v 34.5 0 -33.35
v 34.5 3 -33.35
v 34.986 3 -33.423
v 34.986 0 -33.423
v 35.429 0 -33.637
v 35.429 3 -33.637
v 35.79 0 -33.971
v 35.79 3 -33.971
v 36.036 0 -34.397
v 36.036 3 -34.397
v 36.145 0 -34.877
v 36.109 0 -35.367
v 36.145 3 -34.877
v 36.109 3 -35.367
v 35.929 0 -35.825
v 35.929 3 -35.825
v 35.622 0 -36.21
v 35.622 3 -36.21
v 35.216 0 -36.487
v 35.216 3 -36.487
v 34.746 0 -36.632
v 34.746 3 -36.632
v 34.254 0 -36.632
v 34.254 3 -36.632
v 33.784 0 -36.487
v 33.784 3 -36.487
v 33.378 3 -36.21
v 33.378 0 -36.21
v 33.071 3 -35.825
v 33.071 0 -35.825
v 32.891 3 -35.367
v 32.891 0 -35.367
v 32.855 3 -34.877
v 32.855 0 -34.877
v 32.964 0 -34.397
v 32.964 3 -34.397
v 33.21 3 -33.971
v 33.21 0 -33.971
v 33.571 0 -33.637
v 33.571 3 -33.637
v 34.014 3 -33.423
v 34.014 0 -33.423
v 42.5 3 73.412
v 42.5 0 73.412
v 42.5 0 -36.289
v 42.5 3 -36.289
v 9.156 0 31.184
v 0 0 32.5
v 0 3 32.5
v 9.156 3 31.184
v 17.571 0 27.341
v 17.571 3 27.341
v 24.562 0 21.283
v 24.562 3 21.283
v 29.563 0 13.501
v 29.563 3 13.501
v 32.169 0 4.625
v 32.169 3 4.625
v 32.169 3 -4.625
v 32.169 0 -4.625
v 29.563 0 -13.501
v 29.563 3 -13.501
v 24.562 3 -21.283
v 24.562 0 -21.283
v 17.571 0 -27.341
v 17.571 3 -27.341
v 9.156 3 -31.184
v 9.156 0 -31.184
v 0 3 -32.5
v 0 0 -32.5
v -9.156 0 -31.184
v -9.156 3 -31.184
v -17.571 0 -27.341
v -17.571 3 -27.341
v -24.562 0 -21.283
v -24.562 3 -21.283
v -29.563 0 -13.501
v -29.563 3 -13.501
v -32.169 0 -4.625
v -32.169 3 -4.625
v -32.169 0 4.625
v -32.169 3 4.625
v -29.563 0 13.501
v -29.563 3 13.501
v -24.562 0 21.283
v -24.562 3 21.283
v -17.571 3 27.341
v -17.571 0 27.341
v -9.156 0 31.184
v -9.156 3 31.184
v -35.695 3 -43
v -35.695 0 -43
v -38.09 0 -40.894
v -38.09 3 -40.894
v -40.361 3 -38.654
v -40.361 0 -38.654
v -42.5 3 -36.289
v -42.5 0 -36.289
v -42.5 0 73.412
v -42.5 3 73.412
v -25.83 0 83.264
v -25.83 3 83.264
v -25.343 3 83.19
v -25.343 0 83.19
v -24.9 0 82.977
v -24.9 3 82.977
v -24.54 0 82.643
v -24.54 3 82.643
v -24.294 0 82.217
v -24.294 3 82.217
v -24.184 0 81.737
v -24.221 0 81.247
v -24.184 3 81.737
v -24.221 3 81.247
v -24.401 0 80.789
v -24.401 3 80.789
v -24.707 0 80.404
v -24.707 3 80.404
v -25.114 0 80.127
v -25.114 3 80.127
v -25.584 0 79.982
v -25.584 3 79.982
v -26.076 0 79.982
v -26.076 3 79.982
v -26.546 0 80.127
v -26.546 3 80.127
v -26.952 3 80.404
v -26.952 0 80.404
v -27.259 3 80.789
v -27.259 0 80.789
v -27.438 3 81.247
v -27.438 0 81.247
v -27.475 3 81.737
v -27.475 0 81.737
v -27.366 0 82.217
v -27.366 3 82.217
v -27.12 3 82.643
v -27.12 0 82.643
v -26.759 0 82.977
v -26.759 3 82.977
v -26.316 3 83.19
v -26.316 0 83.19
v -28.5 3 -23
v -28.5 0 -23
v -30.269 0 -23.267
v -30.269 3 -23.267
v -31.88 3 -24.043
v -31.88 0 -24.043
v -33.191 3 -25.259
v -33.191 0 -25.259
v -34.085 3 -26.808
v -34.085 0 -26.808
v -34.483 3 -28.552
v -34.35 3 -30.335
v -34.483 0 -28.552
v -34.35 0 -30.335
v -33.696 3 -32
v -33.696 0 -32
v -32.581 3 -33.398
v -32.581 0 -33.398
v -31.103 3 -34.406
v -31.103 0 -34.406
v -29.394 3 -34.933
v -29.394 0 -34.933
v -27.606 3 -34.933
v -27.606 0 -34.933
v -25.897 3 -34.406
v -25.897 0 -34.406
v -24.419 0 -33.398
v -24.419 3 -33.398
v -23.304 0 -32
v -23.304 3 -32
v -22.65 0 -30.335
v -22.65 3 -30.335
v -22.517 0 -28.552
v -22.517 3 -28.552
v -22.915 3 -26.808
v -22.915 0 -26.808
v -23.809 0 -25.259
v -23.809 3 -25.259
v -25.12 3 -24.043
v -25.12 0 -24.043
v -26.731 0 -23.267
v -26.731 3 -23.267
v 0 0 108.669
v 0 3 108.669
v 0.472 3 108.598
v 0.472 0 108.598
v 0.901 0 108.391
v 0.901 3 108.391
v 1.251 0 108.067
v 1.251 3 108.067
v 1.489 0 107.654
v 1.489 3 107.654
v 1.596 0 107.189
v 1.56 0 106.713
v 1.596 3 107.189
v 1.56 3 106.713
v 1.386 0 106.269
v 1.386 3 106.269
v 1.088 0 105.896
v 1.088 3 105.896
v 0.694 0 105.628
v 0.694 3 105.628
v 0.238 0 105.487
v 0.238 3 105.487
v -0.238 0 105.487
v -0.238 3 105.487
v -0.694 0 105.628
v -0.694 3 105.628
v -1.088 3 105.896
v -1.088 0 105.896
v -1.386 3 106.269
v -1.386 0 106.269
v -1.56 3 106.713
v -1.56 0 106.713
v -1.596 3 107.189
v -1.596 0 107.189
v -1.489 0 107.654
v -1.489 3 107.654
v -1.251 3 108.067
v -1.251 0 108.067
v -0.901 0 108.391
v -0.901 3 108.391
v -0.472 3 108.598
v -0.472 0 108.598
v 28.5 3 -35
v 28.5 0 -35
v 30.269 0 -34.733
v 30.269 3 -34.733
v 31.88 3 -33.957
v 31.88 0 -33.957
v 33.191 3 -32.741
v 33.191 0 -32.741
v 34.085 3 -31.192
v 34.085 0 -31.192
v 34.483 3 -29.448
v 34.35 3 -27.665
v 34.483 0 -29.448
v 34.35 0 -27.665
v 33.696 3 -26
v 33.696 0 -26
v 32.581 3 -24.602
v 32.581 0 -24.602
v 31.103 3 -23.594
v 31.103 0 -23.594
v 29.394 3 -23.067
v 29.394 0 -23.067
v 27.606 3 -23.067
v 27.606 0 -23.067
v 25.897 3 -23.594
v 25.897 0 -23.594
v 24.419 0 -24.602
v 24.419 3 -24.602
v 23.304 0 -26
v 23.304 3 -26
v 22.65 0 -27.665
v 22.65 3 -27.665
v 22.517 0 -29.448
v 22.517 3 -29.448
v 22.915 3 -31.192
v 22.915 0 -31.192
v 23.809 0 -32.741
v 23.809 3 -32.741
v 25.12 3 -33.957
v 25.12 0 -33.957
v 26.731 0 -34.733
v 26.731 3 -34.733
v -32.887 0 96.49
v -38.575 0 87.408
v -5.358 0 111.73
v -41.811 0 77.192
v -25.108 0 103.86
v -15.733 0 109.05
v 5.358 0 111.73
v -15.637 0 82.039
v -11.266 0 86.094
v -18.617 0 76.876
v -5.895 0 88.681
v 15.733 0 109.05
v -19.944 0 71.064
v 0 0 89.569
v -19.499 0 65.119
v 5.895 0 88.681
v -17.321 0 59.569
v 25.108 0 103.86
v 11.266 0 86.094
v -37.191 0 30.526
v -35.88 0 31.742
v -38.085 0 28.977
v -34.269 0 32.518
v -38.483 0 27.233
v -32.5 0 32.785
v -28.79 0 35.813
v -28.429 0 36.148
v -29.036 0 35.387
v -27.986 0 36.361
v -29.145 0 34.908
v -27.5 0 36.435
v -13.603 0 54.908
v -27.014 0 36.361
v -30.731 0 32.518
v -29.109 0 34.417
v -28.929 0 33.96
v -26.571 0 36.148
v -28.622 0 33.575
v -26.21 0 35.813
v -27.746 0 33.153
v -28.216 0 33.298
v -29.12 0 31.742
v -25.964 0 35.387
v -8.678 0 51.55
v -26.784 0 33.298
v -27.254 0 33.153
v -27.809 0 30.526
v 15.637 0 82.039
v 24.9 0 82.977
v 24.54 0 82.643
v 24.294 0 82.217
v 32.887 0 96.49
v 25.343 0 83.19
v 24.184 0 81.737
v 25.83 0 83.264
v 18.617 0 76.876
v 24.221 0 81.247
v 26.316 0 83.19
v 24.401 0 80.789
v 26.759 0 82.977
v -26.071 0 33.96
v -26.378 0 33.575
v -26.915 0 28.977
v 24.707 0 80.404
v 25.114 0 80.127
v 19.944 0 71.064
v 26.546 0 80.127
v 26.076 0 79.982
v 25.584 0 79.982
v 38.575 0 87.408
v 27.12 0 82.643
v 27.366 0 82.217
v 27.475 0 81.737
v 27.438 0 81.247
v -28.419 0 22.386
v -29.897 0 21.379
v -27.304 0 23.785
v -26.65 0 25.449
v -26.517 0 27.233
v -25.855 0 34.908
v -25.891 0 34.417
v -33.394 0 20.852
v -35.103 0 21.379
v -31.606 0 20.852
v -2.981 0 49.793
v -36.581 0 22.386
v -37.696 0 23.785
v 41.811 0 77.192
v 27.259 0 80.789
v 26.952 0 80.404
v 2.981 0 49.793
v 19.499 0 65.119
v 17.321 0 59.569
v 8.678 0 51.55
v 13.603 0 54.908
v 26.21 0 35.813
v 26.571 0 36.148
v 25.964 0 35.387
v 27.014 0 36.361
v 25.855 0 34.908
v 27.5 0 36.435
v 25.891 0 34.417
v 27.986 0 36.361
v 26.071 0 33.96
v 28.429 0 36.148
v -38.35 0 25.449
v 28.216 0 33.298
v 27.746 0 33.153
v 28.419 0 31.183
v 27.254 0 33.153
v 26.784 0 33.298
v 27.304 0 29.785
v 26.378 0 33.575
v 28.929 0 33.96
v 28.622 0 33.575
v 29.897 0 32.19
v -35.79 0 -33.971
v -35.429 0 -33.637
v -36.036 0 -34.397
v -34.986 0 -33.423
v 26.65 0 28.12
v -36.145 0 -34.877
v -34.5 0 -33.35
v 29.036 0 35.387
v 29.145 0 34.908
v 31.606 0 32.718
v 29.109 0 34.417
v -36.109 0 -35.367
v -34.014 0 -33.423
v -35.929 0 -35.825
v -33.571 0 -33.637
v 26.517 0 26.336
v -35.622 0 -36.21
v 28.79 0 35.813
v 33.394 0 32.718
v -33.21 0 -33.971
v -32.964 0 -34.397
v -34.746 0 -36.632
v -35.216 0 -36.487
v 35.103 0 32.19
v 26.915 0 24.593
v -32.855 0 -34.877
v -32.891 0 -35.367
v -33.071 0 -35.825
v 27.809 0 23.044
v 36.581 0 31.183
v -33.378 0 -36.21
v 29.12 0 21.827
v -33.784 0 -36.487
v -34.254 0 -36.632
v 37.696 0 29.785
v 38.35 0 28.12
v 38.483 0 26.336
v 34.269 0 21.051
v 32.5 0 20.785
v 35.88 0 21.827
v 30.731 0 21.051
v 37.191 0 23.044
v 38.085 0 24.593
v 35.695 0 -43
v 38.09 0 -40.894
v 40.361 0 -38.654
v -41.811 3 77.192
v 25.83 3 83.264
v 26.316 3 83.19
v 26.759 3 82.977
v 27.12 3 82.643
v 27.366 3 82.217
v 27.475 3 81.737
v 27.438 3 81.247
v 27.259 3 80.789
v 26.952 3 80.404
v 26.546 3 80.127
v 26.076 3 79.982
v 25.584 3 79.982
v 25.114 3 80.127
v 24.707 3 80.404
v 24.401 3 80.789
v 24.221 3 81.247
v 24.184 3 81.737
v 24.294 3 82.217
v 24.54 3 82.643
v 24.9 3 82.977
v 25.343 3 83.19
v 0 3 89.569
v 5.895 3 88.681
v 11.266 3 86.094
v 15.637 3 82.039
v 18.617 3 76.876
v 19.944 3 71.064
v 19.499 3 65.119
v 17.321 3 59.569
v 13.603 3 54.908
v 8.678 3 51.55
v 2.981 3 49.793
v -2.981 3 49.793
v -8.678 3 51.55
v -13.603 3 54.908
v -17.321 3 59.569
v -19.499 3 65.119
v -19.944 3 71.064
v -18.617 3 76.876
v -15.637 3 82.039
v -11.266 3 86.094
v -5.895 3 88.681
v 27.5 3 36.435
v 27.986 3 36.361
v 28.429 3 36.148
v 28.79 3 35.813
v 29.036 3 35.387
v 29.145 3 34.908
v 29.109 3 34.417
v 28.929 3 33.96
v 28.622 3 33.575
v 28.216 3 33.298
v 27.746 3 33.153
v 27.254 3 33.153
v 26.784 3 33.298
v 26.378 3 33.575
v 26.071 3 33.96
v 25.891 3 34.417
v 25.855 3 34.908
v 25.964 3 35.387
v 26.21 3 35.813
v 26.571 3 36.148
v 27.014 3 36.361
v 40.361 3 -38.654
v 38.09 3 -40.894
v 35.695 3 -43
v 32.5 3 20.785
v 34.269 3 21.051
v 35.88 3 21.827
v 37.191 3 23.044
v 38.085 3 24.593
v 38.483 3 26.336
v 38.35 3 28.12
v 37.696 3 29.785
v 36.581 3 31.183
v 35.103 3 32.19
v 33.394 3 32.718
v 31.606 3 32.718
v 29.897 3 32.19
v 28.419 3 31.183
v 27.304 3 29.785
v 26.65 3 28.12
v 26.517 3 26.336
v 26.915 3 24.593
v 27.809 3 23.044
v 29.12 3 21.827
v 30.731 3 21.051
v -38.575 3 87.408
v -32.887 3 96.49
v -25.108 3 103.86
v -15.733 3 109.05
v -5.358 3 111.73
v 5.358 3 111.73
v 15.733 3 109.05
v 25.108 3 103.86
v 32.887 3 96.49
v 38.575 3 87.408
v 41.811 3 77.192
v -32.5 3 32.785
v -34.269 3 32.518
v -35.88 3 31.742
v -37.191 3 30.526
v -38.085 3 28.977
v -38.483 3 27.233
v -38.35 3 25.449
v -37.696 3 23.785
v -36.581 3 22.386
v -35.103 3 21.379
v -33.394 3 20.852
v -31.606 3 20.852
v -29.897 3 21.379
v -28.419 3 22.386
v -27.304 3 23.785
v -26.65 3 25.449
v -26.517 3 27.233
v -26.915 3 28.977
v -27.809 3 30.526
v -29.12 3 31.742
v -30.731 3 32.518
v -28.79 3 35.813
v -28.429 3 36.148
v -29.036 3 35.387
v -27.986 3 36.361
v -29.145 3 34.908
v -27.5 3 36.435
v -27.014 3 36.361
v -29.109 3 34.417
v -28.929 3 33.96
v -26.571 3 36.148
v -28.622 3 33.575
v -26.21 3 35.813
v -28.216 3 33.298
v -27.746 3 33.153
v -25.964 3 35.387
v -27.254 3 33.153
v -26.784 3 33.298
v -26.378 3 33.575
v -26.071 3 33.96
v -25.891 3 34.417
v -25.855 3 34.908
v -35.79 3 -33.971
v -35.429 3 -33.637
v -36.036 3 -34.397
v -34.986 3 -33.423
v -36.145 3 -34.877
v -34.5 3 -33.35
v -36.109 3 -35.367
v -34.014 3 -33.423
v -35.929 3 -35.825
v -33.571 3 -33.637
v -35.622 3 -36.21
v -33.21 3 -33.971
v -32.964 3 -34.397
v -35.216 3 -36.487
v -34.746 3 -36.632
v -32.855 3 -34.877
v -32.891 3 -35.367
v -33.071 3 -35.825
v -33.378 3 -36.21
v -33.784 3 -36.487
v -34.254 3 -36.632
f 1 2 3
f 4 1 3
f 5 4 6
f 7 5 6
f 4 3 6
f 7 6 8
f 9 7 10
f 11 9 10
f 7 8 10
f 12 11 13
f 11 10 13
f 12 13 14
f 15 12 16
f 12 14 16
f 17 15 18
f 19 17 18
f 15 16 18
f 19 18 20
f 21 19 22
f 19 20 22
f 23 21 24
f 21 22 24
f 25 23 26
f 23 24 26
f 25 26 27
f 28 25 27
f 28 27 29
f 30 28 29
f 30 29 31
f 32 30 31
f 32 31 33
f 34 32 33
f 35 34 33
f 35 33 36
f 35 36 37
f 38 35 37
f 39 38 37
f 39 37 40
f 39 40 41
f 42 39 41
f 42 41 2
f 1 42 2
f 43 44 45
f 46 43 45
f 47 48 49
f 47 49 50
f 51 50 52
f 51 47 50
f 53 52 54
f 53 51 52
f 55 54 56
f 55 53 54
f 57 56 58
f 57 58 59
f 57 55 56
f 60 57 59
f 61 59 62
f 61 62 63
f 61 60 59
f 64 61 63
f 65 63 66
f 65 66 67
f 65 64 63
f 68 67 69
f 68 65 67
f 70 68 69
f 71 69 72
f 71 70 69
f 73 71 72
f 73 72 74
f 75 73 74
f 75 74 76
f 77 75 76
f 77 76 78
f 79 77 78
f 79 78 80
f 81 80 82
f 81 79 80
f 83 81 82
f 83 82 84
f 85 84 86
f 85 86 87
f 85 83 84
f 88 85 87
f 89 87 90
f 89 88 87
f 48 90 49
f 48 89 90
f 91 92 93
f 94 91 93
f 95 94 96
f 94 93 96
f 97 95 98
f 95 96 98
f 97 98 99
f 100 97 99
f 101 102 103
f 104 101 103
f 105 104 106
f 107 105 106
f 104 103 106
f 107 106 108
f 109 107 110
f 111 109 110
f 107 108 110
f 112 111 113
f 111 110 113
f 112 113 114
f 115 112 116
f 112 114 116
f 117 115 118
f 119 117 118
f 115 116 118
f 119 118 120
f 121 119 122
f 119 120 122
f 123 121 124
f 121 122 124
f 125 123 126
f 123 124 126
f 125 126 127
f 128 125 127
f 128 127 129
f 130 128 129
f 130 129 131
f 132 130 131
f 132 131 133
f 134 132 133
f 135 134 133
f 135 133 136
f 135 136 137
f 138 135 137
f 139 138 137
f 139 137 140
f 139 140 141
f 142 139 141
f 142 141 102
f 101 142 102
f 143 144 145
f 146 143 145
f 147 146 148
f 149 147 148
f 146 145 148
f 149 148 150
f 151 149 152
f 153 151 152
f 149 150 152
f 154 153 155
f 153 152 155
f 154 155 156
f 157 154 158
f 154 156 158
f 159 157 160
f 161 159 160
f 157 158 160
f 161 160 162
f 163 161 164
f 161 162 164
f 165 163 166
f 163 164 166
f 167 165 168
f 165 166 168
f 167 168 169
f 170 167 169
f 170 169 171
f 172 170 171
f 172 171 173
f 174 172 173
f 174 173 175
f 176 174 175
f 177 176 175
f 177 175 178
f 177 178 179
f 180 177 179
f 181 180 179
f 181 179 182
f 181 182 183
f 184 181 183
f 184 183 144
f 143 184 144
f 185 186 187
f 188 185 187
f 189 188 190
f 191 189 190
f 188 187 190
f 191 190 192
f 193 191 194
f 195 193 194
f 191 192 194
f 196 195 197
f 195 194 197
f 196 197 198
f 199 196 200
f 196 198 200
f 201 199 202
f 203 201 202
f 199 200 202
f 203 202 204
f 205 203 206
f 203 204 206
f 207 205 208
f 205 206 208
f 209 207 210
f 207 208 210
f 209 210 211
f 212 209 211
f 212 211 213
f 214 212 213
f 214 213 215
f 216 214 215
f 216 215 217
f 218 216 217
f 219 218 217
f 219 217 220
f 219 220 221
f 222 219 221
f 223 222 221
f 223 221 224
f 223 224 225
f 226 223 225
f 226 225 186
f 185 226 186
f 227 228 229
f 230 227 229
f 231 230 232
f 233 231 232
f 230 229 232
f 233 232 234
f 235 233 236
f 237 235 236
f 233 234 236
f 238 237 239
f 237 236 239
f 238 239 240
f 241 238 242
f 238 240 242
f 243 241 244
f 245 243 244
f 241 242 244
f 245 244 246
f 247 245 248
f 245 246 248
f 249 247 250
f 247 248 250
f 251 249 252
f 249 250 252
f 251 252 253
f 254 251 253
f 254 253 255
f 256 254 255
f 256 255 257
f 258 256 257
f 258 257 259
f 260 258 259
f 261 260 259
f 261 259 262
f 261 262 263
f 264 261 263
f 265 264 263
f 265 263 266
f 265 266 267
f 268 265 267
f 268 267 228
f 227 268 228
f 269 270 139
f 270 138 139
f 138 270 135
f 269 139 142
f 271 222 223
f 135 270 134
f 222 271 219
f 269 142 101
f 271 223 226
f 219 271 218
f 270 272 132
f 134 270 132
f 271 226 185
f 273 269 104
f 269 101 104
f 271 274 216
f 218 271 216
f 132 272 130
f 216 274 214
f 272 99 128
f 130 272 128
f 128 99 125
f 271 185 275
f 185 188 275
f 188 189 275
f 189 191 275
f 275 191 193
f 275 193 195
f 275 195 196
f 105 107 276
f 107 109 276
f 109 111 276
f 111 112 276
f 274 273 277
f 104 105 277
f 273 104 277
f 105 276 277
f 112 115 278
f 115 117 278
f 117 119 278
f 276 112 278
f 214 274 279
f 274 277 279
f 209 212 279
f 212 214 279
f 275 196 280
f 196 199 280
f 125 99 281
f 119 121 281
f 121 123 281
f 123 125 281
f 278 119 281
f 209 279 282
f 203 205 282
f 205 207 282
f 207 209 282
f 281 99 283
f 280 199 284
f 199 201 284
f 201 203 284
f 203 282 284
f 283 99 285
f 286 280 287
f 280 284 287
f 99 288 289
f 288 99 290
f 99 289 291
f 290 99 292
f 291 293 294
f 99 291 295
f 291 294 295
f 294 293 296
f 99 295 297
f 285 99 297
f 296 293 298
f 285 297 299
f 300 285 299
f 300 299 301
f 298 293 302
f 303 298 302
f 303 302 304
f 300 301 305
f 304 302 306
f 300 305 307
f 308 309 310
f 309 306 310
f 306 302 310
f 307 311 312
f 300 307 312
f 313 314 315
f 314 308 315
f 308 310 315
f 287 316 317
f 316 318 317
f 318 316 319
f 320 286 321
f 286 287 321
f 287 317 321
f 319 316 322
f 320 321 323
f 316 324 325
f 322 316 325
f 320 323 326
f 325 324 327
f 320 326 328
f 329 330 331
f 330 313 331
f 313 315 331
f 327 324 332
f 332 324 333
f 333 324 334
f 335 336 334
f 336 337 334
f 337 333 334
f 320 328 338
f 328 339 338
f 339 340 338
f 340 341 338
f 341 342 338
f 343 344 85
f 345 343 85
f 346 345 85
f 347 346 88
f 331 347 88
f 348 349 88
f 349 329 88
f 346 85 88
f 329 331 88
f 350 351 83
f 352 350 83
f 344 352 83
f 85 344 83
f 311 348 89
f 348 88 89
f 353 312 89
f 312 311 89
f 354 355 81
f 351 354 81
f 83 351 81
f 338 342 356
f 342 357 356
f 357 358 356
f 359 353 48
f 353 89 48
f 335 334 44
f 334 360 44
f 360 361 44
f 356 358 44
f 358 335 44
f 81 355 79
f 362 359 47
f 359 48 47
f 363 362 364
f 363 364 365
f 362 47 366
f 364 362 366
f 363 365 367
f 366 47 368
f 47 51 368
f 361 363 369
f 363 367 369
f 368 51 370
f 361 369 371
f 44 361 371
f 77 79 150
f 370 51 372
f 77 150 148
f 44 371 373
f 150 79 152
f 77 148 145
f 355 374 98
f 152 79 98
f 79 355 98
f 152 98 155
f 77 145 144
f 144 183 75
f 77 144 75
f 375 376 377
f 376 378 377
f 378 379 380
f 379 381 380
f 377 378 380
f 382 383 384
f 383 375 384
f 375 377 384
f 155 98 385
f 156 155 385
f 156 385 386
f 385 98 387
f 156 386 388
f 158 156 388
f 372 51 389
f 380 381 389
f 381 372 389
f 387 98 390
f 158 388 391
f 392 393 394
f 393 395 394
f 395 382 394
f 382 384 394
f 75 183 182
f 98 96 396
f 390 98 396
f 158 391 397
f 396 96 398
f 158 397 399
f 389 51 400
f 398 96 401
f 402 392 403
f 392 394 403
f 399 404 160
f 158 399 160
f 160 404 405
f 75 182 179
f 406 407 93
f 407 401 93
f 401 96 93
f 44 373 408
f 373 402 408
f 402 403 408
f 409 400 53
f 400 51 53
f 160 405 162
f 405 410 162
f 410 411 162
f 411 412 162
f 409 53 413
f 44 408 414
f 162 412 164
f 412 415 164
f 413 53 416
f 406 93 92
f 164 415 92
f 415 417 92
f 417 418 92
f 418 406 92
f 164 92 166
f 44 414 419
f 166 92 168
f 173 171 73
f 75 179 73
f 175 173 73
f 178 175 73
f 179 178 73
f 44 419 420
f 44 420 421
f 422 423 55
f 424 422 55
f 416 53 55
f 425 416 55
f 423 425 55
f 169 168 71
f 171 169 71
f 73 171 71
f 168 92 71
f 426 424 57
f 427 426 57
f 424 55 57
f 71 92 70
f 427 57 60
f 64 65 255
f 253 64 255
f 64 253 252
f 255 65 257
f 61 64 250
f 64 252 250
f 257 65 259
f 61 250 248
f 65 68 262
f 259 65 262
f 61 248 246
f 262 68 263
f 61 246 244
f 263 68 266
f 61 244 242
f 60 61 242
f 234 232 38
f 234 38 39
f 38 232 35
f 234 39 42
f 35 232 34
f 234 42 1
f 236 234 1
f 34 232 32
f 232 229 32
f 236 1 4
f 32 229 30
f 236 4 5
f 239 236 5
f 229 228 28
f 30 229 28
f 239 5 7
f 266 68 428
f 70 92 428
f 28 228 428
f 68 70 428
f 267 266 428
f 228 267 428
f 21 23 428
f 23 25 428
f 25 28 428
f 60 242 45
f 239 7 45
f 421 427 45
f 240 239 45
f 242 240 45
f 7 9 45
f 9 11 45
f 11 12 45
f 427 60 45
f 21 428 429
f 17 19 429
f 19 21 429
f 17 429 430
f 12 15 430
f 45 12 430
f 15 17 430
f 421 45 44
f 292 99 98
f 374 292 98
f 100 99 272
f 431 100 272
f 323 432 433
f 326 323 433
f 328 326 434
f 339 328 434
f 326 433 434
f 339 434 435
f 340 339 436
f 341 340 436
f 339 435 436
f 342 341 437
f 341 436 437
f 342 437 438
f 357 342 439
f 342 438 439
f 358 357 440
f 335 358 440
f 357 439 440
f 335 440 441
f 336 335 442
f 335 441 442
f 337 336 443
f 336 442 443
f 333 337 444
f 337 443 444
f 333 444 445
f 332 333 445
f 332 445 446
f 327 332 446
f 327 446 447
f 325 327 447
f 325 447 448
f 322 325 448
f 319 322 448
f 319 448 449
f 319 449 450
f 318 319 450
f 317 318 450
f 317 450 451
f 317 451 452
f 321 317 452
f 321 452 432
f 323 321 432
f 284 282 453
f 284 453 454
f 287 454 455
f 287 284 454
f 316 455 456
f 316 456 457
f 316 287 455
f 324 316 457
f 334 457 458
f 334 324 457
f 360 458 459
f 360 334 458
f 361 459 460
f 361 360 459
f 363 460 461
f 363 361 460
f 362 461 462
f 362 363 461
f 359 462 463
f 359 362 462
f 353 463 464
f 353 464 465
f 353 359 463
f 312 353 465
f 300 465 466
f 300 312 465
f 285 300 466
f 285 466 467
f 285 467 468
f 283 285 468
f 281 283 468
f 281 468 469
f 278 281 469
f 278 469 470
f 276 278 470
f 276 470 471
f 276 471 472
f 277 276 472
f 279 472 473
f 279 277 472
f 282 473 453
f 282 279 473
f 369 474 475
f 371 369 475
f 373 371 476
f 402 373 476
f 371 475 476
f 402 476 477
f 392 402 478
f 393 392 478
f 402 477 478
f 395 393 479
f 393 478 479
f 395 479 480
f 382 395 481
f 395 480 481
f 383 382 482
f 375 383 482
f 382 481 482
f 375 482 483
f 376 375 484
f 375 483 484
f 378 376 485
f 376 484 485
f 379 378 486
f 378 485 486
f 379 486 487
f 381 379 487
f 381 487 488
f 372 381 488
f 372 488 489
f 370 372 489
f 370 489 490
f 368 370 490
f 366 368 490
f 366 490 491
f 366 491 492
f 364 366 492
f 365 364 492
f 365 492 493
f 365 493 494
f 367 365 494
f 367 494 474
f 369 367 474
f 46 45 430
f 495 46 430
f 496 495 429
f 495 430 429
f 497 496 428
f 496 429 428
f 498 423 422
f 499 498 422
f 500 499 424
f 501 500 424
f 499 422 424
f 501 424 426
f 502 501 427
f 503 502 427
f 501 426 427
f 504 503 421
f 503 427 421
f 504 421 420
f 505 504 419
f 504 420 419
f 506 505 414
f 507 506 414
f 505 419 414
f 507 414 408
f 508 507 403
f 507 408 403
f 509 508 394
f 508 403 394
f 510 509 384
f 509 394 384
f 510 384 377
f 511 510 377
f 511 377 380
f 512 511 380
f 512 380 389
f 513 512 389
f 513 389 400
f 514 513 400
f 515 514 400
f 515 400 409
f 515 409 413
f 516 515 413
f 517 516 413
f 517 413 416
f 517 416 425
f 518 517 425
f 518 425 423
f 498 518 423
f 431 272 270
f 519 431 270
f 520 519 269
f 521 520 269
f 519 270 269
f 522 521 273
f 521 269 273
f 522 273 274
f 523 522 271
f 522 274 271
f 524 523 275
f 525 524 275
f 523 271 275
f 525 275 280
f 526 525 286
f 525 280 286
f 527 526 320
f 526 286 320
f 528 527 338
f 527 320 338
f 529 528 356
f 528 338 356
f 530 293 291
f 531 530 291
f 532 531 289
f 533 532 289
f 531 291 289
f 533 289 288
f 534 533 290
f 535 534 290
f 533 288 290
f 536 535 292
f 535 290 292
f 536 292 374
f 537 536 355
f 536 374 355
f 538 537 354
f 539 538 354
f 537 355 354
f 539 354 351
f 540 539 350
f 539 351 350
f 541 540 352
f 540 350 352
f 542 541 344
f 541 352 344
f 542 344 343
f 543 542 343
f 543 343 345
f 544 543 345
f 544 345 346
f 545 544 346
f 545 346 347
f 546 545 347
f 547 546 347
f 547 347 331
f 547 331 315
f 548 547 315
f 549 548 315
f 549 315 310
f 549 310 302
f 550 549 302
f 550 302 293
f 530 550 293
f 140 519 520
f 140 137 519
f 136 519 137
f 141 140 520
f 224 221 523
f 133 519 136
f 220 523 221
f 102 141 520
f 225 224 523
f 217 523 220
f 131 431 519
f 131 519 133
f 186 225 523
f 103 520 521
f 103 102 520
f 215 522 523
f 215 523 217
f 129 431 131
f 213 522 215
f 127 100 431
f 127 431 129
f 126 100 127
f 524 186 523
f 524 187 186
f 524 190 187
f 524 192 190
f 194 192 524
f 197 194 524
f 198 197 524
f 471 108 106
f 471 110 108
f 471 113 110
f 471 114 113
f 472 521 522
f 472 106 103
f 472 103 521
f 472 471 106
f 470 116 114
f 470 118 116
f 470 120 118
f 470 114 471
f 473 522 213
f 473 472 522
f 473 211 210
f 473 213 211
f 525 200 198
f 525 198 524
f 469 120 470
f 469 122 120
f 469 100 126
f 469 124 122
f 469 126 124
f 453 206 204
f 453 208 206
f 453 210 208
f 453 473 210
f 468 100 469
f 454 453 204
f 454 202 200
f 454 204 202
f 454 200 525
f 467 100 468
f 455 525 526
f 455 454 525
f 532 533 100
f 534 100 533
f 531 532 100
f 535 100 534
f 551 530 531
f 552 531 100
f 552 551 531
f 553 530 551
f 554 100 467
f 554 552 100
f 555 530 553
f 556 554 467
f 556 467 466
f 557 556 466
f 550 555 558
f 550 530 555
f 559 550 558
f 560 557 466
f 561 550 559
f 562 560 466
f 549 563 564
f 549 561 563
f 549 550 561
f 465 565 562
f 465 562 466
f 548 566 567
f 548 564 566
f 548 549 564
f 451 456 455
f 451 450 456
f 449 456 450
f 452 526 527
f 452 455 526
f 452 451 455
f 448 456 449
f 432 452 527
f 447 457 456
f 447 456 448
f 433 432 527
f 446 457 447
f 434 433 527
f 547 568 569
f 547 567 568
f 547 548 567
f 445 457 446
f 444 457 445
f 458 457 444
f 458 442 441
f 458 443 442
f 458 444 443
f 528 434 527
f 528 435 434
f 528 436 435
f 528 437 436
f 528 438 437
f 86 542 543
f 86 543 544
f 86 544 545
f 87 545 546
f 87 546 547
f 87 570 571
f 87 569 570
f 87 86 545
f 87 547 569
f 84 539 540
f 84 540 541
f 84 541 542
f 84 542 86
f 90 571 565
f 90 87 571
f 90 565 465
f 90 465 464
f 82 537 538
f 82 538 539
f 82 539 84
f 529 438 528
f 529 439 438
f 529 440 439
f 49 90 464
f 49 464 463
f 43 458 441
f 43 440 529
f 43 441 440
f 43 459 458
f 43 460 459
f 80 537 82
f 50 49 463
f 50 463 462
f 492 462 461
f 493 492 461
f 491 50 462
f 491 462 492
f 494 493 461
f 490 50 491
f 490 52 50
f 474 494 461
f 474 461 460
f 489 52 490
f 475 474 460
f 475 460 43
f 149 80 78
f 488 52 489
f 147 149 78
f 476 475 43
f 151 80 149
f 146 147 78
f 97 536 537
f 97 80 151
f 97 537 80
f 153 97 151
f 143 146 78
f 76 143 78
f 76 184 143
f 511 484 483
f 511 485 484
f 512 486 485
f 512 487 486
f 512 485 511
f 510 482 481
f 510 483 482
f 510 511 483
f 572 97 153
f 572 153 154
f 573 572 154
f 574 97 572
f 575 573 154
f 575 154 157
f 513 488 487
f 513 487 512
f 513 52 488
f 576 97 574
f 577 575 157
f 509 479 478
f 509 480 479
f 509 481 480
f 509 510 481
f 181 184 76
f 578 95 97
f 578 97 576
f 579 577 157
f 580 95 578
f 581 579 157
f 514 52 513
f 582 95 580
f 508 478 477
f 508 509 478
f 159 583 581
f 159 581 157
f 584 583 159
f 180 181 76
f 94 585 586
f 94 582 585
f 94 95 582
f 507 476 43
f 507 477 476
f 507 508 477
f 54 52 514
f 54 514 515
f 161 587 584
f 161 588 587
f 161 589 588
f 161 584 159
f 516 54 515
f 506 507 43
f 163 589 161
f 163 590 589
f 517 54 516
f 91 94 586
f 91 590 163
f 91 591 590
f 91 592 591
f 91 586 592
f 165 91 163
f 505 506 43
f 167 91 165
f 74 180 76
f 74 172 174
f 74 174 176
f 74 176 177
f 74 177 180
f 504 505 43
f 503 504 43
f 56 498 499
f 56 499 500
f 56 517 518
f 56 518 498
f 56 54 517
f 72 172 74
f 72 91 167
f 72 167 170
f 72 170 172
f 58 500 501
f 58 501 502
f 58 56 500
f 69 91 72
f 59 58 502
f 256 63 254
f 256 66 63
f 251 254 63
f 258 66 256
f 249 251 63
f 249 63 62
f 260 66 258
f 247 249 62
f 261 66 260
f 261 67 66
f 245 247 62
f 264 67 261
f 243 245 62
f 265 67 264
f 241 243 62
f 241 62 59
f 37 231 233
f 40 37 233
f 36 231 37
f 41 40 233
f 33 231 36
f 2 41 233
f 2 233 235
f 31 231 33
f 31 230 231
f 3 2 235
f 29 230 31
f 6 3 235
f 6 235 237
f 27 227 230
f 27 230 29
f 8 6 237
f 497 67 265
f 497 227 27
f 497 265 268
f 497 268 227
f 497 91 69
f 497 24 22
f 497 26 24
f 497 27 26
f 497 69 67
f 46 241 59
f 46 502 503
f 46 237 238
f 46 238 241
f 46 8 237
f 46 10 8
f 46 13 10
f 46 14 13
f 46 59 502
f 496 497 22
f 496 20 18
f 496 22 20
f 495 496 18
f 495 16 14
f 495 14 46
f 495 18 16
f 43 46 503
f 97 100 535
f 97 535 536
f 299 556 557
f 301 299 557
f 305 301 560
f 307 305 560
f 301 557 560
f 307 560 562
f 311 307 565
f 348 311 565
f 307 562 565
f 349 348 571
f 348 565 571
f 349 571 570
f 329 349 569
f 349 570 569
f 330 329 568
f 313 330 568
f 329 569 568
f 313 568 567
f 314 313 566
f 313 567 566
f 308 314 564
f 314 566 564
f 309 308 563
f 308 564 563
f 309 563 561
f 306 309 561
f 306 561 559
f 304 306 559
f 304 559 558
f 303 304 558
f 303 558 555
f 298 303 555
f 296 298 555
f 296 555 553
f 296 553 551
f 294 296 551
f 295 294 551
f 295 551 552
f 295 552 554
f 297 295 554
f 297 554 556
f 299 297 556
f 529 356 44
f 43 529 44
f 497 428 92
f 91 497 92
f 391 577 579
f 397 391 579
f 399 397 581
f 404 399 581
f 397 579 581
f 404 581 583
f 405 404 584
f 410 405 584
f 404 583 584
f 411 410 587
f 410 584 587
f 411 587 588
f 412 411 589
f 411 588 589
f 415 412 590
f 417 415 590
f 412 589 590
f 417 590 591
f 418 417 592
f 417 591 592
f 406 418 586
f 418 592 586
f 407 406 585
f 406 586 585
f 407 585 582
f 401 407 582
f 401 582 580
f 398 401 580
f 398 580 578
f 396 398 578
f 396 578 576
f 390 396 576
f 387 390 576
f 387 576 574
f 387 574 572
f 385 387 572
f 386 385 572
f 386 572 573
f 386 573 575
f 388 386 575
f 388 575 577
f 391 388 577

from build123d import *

# Parameters (mm, degrees)
SKETCH1_R           = 32.5
SKETCH1_R_2         = 20
BOSS_EXTRUDE1_DEPTH = 3
SKETCH5_R           = 1.6
CUT_EXTRUDE1_DEPTH  = 10
SKETCH6_R           = 1.65
CUT_EXTRUDE2_DEPTH  = 10
SKETCH8_R           = 6
CUT_EXTRUDE3_DEPTH  = 10


with BuildPart() as part:
    # Sketch1 → Boss-Extrude1 (new body)
    with BuildSketch(Plane(origin=(0, 0, 0), x_dir=(1, 0, 0), z_dir=(0, 1, 0))):
        with BuildLine():
            Line((-42.5, -73.411966665), (-41.810700901, -77.192472856))
            ThreePointArc((-41.810700901, -77.192472856), (0, -112.069134335), (41.810700901, -77.192472856))
            Line((41.810700901, -77.192472856), (42.5, -73.411966665))
            Line((42.5, -73.411966665), (42.5, 36.289181897))
            ThreePointArc((42.5, 36.289181897), (39.241370505, 39.790319974), (35.695303931, 43))
            Line((35.695303931, 43), (-35.695303931, 43))
            ThreePointArc((-35.695303931, 43), (-39.241370505, 39.790319974), (-42.5, 36.289181897))
            Line((-42.5, 36.289181897), (-42.5, -73.411966665))
        make_face()
        with Locations(Location((0, 0, 0), (0, 0, 270))):
            Circle(SKETCH1_R, mode=Mode.SUBTRACT)
        with Locations(Location((0, -69.569134335, 0), (0, 0, 270))):
            Circle(SKETCH1_R_2, mode=Mode.SUBTRACT)
    extrude(amount=BOSS_EXTRUDE1_DEPTH)

    # Sketch5 → Cut-Extrude1 (cut)
    with BuildSketch(Plane(origin=(0, 3, 0), x_dir=(1, 0, 0), z_dir=(0, 1, 0))):
        with Locations(Location((0, -107.069134335, 0), (0, 0, 270))):
            Circle(SKETCH5_R)
    extrude(amount=-CUT_EXTRUDE1_DEPTH, mode=Mode.SUBTRACT)

    # Sketch6 → Cut-Extrude2 (cut)
    with BuildSketch(Plane(origin=(0, 3, 0), x_dir=(1, 0, 0), z_dir=(0, 1, 0))):
        with Locations(Location((-34.5, 35, 0), (0, 0, 270))):
            Circle(SKETCH6_R)
        with Locations(Location((34.5, 35, 0), (0, 0, 270))):
            Circle(SKETCH6_R)
        with Locations(Location((27.5, -34.784567168, 0), (0, 0, 270))):
            Circle(SKETCH6_R)
        with Locations(Location((25.829771931, -81.613754795, 0), (0, 0, 270))):
            Circle(SKETCH6_R)
        with Locations(Location((-25.829771931, -81.613754795, 0), (0, 0, 270))):
            Circle(SKETCH6_R)
        with Locations(Location((-27.5, -34.784567168, 0), (0, 0, 270))):
            Circle(SKETCH6_R)
    extrude(amount=-CUT_EXTRUDE2_DEPTH, mode=Mode.SUBTRACT)

    # Sketch8 → Cut-Extrude3 (cut)
    with BuildSketch(Plane.XZ):
        with Locations(Location((28.5, -29, 0), (0, 0, 270))):
            Circle(SKETCH8_R)
        with Locations(Location((32.5, 26.784567168, 0), (0, 0, 270))):
            Circle(SKETCH8_R)
        with Locations(Location((-32.5, 26.784567168, 0), (0, 0, 90))):
            Circle(SKETCH8_R)
        with Locations(Location((-28.5, -29, 0), (0, 0, 90))):
            Circle(SKETCH8_R)
    extrude(amount=-CUT_EXTRUDE3_DEPTH, mode=Mode.SUBTRACT)


solid = part.part
